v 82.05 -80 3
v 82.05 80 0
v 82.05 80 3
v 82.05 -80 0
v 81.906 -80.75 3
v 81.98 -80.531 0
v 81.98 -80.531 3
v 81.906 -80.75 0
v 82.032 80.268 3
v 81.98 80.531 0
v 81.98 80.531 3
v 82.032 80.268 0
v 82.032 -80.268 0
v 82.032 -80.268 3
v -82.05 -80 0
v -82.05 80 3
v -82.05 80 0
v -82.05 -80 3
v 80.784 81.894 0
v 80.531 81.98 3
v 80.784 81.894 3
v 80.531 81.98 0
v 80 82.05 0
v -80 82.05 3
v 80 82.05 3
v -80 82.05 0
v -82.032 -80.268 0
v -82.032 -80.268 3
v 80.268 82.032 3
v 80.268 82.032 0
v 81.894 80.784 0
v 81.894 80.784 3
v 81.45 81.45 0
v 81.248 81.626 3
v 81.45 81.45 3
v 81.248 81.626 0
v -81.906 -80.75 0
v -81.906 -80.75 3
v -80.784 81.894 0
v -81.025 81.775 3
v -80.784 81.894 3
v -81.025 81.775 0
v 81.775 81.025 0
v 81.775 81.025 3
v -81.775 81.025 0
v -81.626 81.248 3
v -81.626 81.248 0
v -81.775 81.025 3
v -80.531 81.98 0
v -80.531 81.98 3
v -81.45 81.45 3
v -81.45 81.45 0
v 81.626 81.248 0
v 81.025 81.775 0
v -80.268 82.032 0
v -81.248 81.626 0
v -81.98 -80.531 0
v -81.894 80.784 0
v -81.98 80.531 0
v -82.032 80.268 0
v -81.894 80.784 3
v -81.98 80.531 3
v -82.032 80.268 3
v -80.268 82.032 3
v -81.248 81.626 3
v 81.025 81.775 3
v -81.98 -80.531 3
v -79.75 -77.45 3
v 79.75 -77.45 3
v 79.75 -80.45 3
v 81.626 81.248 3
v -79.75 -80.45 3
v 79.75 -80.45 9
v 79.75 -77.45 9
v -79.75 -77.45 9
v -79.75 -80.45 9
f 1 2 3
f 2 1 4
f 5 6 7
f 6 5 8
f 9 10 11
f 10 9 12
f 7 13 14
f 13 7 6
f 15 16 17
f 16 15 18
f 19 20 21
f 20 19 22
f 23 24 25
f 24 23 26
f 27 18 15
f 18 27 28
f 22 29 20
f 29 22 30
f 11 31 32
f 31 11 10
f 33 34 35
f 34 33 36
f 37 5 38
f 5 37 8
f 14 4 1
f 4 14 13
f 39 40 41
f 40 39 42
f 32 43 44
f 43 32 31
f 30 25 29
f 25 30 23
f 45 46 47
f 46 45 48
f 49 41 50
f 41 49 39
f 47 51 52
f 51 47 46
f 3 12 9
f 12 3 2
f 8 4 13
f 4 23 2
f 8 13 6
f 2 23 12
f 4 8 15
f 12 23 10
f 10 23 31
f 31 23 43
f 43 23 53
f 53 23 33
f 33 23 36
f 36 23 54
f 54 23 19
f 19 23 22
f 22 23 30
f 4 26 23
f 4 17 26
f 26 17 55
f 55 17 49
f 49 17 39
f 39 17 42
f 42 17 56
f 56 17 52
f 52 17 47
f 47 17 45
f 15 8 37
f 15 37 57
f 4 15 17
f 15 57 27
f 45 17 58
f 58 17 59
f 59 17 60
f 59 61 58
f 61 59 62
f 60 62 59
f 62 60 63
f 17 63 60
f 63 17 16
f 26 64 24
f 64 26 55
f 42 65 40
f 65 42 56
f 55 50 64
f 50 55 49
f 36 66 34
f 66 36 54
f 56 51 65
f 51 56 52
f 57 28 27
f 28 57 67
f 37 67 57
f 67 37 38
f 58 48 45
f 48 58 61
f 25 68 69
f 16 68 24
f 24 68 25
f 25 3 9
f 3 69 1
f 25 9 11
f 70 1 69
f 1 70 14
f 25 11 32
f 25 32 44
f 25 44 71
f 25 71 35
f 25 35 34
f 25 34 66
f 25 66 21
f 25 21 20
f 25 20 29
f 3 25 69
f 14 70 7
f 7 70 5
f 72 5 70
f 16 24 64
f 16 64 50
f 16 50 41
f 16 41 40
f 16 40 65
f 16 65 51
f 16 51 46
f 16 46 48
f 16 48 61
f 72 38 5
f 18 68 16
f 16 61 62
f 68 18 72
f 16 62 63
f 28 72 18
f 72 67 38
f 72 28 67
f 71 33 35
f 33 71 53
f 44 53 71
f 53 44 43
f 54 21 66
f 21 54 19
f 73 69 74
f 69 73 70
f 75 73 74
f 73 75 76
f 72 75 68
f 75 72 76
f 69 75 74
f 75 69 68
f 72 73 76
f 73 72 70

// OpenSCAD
// rig_shelf.scad — the plate between the drawer bay and the electronics.
//
// Sits on the frame's tongue, inside the cup's skirt; the cup's walls bear on
// it. Its front edge spans the drawer opening with nothing under it, so an
// upstand along that edge — inside the cup's front wall — stiffens it. The
// upstand is on TOP so the drawer bay stays clear.
//
// Prints flat, upstand up.

include <rig_common.scad>

UPSTAND_H = 6;
FRONT_Y   = -(D/2 - WALL);            // the cup's front wall comes down in front of this edge

module rig_shelf() {
    difference() {
        union() {
            linear_extrude(SHELF_T) intersection() {
                rrect(TONGUE_OUT_W, TONGUE_OUT_D, TONGUE_R);
                translate([-W/2, FRONT_Y]) square([W, D]);      // trim the front
            }
            translate([-(W/2 - WALL - 1), FRONT_Y + 0.3, SHELF_T])
                cube([W - 2*WALL - 2, WALL, UPSTAND_H]);
        }
    }
}

rig_shelf();
echo(str("rig_shelf: ", TONGUE_OUT_W, " x ", TONGUE_OUT_D/2 - FRONT_Y, " x ", SHELF_T, " (+", UPSTAND_H, " upstand)"));
